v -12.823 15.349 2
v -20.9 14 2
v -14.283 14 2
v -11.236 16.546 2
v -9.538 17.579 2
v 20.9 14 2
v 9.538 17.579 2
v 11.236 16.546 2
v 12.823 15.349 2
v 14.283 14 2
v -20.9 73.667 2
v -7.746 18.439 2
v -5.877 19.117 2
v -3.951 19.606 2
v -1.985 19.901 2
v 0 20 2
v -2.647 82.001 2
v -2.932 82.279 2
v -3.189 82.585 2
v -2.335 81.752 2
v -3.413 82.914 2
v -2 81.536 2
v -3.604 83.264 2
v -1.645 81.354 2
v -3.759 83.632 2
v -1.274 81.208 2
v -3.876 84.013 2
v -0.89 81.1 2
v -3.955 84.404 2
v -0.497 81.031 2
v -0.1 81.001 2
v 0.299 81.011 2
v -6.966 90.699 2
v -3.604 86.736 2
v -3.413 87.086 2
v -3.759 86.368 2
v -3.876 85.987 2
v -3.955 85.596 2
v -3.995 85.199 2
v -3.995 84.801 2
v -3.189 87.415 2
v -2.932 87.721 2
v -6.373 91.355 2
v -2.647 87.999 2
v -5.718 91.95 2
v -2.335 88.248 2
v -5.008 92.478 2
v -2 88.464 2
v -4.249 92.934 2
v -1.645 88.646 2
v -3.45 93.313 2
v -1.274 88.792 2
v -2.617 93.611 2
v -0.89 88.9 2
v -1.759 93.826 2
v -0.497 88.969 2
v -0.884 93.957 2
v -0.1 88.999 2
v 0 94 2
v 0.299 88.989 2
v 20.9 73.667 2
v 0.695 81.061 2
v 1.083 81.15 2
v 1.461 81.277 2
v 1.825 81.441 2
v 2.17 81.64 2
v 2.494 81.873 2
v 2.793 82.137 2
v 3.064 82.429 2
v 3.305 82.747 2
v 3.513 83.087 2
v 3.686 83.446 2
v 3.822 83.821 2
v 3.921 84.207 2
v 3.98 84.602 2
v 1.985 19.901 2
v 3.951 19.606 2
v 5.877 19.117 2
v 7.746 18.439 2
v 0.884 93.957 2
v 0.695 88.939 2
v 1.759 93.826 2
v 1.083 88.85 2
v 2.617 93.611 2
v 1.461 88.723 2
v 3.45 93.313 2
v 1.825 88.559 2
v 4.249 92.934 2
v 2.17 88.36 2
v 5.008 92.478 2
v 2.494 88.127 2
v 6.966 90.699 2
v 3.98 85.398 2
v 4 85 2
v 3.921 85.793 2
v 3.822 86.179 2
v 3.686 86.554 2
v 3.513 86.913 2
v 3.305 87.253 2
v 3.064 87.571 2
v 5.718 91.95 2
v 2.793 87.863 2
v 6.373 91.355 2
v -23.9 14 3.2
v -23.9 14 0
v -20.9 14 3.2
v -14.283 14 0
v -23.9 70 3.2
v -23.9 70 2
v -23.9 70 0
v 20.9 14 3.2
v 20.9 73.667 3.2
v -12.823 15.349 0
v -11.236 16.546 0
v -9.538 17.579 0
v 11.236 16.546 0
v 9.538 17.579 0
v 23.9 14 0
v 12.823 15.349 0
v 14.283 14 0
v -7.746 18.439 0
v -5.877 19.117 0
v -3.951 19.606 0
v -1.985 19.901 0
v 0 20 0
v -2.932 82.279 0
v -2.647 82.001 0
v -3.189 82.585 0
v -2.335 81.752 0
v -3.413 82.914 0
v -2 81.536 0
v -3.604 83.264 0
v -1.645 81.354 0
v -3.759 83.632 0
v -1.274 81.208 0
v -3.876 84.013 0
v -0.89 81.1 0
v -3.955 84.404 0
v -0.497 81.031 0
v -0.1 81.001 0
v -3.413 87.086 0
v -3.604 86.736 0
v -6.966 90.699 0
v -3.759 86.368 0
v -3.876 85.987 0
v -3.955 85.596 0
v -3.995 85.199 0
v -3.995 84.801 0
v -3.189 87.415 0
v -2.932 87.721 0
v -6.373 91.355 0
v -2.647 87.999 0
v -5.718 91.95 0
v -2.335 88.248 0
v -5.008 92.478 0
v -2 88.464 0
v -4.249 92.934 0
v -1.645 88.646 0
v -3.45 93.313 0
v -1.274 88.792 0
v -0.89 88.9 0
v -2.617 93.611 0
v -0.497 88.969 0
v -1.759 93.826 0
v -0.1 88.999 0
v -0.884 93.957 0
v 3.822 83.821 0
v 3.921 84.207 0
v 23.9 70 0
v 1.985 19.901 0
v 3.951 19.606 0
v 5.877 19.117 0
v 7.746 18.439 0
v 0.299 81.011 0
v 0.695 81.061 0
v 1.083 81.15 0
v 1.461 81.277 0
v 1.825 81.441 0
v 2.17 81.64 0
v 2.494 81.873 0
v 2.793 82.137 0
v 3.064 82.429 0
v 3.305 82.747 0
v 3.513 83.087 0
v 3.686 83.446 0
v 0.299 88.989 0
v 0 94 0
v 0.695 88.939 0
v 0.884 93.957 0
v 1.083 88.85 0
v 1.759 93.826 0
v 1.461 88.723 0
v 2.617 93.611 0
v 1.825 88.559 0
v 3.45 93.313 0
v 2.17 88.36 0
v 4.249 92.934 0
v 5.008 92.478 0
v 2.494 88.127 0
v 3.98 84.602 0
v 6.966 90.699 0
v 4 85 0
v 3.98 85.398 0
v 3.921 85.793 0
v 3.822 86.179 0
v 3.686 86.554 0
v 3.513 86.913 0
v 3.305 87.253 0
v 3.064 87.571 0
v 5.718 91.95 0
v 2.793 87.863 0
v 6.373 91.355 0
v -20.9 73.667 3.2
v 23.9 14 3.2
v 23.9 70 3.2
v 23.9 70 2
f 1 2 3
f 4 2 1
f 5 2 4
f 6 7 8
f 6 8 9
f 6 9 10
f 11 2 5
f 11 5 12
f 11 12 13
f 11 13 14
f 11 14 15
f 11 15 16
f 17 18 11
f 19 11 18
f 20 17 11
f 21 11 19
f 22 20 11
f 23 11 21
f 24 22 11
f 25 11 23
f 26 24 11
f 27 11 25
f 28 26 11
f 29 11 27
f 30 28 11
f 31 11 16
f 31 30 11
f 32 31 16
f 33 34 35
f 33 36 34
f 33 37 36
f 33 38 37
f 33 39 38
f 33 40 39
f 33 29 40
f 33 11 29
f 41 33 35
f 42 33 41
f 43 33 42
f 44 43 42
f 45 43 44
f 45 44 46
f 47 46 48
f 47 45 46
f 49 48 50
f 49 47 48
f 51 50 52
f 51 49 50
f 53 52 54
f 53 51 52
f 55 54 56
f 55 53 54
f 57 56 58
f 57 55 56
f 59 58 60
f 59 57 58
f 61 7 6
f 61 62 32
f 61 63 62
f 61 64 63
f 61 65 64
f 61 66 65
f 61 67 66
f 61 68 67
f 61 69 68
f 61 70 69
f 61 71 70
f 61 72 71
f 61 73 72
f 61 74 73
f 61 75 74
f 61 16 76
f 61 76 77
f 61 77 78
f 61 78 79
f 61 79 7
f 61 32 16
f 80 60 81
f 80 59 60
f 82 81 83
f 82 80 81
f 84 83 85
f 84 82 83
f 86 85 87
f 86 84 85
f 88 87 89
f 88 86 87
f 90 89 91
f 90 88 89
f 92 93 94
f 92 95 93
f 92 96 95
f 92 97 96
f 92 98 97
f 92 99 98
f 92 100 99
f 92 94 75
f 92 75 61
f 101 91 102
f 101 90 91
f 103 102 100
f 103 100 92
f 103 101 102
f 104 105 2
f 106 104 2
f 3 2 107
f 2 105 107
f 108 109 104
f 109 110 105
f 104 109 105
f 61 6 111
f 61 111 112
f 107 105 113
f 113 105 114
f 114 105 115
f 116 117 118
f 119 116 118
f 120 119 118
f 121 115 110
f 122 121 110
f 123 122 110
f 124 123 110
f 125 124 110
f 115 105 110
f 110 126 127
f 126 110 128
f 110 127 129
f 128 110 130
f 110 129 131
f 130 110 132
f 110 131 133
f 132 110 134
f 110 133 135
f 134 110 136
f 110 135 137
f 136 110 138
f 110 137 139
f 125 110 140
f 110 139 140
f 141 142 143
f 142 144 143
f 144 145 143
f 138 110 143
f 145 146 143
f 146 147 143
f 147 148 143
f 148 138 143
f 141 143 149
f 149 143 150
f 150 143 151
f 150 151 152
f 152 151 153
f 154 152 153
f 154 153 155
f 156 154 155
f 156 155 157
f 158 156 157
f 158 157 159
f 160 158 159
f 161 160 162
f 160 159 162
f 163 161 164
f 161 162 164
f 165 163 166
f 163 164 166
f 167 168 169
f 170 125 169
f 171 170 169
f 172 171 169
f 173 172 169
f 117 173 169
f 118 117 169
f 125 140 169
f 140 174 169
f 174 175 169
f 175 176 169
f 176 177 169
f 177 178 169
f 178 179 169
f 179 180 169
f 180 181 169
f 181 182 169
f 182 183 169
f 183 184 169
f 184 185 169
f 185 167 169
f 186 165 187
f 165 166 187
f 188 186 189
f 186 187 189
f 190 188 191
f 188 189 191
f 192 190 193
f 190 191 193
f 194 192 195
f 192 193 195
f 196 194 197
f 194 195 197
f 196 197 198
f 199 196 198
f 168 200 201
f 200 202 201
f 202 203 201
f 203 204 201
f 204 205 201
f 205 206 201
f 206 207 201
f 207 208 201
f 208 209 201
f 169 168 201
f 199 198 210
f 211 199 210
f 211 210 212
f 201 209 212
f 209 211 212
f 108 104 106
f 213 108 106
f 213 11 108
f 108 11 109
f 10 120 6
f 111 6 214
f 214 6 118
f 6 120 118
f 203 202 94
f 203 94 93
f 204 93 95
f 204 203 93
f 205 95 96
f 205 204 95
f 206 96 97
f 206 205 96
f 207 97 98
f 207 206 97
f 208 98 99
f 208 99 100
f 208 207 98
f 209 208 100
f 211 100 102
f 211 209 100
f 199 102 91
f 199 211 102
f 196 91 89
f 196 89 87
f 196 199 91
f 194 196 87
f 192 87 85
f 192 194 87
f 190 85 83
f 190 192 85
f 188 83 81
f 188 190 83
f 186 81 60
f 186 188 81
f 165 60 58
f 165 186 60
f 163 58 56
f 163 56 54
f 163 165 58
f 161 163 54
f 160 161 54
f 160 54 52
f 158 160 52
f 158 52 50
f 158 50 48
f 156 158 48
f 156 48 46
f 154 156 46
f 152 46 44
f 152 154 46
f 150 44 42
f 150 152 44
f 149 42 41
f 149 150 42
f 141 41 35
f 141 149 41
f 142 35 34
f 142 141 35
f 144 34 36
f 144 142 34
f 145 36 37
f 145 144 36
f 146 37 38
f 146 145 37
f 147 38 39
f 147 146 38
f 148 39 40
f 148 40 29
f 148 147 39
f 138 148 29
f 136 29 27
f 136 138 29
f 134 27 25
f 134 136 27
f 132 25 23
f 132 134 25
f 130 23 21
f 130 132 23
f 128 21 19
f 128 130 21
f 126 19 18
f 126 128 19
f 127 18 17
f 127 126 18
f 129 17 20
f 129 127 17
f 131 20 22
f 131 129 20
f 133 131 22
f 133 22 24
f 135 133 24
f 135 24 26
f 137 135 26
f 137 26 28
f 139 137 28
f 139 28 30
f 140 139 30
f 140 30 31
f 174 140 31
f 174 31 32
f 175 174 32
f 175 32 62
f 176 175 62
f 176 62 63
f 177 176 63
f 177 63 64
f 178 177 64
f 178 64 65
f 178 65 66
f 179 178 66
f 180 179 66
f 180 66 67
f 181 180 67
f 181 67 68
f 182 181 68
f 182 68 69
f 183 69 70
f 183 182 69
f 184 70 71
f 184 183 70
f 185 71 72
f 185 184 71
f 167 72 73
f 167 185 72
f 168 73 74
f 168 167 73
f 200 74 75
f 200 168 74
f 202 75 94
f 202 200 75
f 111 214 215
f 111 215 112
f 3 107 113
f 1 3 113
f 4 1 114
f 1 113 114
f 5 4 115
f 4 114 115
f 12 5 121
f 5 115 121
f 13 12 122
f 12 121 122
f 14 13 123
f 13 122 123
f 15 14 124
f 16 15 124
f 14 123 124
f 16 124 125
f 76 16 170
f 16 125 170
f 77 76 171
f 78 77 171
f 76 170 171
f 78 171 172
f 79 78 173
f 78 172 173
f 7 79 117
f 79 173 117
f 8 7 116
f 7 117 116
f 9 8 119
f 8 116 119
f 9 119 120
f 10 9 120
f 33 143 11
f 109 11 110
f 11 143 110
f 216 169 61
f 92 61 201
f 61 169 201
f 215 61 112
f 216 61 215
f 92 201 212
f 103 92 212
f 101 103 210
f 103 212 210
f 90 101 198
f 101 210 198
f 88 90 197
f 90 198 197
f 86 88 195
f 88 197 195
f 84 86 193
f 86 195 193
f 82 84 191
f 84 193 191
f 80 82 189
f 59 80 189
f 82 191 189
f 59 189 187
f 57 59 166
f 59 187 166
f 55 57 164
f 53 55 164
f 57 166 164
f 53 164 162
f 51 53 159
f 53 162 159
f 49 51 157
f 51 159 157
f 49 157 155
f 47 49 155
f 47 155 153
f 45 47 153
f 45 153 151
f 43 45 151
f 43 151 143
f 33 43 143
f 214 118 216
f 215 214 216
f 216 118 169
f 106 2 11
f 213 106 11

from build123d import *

# Parameters (mm, degrees)
ESQUISSE1_R        = 4
BOSS_EXTRU_1_DEPTH = 2
BOSS_EXTRU_2_DEPTH = 1.2


with BuildPart() as part:
    # Esquisse1 → Boss.-Extru.1 (new body)
    with BuildSketch(Plane.XY):
        with BuildLine():
            Line((-23.9, 14), (-14.282856857, 14))
            ThreePointArc((-14.282856857, 14), (0, 20), (14.282856857, 14))
            Line((14.282856857, 14), (23.9, 14))
            Line((23.9, 14), (23.9, 70))
            Line((23.9, 70), (6.965826107, 90.69888293))
            ThreePointArc((6.965826107, 90.69888293), (0, 94), (-6.965826107, 90.69888293))
            Line((-6.965826107, 90.69888293), (-23.9, 70))
            Line((-23.9, 70), (-23.9, 14))
        make_face()
        with Locations((0, 85)):
            Circle(ESQUISSE1_R, mode=Mode.SUBTRACT)
    extrude(amount=BOSS_EXTRU_1_DEPTH)

    # Esquisse2 → Boss.-Extru.2 (add)
    with BuildSketch(Plane.XY.offset(2)):
        Polygon((-23.9, 14), (-20.9, 14), (-20.9, 73.666942904), (-23.9, 70), align=None)
        Polygon((23.9, 14), (20.9, 14), (20.9, 73.666942904), (23.9, 70), align=None)
    extrude(amount=BOSS_EXTRU_2_DEPTH)


solid = part.part
